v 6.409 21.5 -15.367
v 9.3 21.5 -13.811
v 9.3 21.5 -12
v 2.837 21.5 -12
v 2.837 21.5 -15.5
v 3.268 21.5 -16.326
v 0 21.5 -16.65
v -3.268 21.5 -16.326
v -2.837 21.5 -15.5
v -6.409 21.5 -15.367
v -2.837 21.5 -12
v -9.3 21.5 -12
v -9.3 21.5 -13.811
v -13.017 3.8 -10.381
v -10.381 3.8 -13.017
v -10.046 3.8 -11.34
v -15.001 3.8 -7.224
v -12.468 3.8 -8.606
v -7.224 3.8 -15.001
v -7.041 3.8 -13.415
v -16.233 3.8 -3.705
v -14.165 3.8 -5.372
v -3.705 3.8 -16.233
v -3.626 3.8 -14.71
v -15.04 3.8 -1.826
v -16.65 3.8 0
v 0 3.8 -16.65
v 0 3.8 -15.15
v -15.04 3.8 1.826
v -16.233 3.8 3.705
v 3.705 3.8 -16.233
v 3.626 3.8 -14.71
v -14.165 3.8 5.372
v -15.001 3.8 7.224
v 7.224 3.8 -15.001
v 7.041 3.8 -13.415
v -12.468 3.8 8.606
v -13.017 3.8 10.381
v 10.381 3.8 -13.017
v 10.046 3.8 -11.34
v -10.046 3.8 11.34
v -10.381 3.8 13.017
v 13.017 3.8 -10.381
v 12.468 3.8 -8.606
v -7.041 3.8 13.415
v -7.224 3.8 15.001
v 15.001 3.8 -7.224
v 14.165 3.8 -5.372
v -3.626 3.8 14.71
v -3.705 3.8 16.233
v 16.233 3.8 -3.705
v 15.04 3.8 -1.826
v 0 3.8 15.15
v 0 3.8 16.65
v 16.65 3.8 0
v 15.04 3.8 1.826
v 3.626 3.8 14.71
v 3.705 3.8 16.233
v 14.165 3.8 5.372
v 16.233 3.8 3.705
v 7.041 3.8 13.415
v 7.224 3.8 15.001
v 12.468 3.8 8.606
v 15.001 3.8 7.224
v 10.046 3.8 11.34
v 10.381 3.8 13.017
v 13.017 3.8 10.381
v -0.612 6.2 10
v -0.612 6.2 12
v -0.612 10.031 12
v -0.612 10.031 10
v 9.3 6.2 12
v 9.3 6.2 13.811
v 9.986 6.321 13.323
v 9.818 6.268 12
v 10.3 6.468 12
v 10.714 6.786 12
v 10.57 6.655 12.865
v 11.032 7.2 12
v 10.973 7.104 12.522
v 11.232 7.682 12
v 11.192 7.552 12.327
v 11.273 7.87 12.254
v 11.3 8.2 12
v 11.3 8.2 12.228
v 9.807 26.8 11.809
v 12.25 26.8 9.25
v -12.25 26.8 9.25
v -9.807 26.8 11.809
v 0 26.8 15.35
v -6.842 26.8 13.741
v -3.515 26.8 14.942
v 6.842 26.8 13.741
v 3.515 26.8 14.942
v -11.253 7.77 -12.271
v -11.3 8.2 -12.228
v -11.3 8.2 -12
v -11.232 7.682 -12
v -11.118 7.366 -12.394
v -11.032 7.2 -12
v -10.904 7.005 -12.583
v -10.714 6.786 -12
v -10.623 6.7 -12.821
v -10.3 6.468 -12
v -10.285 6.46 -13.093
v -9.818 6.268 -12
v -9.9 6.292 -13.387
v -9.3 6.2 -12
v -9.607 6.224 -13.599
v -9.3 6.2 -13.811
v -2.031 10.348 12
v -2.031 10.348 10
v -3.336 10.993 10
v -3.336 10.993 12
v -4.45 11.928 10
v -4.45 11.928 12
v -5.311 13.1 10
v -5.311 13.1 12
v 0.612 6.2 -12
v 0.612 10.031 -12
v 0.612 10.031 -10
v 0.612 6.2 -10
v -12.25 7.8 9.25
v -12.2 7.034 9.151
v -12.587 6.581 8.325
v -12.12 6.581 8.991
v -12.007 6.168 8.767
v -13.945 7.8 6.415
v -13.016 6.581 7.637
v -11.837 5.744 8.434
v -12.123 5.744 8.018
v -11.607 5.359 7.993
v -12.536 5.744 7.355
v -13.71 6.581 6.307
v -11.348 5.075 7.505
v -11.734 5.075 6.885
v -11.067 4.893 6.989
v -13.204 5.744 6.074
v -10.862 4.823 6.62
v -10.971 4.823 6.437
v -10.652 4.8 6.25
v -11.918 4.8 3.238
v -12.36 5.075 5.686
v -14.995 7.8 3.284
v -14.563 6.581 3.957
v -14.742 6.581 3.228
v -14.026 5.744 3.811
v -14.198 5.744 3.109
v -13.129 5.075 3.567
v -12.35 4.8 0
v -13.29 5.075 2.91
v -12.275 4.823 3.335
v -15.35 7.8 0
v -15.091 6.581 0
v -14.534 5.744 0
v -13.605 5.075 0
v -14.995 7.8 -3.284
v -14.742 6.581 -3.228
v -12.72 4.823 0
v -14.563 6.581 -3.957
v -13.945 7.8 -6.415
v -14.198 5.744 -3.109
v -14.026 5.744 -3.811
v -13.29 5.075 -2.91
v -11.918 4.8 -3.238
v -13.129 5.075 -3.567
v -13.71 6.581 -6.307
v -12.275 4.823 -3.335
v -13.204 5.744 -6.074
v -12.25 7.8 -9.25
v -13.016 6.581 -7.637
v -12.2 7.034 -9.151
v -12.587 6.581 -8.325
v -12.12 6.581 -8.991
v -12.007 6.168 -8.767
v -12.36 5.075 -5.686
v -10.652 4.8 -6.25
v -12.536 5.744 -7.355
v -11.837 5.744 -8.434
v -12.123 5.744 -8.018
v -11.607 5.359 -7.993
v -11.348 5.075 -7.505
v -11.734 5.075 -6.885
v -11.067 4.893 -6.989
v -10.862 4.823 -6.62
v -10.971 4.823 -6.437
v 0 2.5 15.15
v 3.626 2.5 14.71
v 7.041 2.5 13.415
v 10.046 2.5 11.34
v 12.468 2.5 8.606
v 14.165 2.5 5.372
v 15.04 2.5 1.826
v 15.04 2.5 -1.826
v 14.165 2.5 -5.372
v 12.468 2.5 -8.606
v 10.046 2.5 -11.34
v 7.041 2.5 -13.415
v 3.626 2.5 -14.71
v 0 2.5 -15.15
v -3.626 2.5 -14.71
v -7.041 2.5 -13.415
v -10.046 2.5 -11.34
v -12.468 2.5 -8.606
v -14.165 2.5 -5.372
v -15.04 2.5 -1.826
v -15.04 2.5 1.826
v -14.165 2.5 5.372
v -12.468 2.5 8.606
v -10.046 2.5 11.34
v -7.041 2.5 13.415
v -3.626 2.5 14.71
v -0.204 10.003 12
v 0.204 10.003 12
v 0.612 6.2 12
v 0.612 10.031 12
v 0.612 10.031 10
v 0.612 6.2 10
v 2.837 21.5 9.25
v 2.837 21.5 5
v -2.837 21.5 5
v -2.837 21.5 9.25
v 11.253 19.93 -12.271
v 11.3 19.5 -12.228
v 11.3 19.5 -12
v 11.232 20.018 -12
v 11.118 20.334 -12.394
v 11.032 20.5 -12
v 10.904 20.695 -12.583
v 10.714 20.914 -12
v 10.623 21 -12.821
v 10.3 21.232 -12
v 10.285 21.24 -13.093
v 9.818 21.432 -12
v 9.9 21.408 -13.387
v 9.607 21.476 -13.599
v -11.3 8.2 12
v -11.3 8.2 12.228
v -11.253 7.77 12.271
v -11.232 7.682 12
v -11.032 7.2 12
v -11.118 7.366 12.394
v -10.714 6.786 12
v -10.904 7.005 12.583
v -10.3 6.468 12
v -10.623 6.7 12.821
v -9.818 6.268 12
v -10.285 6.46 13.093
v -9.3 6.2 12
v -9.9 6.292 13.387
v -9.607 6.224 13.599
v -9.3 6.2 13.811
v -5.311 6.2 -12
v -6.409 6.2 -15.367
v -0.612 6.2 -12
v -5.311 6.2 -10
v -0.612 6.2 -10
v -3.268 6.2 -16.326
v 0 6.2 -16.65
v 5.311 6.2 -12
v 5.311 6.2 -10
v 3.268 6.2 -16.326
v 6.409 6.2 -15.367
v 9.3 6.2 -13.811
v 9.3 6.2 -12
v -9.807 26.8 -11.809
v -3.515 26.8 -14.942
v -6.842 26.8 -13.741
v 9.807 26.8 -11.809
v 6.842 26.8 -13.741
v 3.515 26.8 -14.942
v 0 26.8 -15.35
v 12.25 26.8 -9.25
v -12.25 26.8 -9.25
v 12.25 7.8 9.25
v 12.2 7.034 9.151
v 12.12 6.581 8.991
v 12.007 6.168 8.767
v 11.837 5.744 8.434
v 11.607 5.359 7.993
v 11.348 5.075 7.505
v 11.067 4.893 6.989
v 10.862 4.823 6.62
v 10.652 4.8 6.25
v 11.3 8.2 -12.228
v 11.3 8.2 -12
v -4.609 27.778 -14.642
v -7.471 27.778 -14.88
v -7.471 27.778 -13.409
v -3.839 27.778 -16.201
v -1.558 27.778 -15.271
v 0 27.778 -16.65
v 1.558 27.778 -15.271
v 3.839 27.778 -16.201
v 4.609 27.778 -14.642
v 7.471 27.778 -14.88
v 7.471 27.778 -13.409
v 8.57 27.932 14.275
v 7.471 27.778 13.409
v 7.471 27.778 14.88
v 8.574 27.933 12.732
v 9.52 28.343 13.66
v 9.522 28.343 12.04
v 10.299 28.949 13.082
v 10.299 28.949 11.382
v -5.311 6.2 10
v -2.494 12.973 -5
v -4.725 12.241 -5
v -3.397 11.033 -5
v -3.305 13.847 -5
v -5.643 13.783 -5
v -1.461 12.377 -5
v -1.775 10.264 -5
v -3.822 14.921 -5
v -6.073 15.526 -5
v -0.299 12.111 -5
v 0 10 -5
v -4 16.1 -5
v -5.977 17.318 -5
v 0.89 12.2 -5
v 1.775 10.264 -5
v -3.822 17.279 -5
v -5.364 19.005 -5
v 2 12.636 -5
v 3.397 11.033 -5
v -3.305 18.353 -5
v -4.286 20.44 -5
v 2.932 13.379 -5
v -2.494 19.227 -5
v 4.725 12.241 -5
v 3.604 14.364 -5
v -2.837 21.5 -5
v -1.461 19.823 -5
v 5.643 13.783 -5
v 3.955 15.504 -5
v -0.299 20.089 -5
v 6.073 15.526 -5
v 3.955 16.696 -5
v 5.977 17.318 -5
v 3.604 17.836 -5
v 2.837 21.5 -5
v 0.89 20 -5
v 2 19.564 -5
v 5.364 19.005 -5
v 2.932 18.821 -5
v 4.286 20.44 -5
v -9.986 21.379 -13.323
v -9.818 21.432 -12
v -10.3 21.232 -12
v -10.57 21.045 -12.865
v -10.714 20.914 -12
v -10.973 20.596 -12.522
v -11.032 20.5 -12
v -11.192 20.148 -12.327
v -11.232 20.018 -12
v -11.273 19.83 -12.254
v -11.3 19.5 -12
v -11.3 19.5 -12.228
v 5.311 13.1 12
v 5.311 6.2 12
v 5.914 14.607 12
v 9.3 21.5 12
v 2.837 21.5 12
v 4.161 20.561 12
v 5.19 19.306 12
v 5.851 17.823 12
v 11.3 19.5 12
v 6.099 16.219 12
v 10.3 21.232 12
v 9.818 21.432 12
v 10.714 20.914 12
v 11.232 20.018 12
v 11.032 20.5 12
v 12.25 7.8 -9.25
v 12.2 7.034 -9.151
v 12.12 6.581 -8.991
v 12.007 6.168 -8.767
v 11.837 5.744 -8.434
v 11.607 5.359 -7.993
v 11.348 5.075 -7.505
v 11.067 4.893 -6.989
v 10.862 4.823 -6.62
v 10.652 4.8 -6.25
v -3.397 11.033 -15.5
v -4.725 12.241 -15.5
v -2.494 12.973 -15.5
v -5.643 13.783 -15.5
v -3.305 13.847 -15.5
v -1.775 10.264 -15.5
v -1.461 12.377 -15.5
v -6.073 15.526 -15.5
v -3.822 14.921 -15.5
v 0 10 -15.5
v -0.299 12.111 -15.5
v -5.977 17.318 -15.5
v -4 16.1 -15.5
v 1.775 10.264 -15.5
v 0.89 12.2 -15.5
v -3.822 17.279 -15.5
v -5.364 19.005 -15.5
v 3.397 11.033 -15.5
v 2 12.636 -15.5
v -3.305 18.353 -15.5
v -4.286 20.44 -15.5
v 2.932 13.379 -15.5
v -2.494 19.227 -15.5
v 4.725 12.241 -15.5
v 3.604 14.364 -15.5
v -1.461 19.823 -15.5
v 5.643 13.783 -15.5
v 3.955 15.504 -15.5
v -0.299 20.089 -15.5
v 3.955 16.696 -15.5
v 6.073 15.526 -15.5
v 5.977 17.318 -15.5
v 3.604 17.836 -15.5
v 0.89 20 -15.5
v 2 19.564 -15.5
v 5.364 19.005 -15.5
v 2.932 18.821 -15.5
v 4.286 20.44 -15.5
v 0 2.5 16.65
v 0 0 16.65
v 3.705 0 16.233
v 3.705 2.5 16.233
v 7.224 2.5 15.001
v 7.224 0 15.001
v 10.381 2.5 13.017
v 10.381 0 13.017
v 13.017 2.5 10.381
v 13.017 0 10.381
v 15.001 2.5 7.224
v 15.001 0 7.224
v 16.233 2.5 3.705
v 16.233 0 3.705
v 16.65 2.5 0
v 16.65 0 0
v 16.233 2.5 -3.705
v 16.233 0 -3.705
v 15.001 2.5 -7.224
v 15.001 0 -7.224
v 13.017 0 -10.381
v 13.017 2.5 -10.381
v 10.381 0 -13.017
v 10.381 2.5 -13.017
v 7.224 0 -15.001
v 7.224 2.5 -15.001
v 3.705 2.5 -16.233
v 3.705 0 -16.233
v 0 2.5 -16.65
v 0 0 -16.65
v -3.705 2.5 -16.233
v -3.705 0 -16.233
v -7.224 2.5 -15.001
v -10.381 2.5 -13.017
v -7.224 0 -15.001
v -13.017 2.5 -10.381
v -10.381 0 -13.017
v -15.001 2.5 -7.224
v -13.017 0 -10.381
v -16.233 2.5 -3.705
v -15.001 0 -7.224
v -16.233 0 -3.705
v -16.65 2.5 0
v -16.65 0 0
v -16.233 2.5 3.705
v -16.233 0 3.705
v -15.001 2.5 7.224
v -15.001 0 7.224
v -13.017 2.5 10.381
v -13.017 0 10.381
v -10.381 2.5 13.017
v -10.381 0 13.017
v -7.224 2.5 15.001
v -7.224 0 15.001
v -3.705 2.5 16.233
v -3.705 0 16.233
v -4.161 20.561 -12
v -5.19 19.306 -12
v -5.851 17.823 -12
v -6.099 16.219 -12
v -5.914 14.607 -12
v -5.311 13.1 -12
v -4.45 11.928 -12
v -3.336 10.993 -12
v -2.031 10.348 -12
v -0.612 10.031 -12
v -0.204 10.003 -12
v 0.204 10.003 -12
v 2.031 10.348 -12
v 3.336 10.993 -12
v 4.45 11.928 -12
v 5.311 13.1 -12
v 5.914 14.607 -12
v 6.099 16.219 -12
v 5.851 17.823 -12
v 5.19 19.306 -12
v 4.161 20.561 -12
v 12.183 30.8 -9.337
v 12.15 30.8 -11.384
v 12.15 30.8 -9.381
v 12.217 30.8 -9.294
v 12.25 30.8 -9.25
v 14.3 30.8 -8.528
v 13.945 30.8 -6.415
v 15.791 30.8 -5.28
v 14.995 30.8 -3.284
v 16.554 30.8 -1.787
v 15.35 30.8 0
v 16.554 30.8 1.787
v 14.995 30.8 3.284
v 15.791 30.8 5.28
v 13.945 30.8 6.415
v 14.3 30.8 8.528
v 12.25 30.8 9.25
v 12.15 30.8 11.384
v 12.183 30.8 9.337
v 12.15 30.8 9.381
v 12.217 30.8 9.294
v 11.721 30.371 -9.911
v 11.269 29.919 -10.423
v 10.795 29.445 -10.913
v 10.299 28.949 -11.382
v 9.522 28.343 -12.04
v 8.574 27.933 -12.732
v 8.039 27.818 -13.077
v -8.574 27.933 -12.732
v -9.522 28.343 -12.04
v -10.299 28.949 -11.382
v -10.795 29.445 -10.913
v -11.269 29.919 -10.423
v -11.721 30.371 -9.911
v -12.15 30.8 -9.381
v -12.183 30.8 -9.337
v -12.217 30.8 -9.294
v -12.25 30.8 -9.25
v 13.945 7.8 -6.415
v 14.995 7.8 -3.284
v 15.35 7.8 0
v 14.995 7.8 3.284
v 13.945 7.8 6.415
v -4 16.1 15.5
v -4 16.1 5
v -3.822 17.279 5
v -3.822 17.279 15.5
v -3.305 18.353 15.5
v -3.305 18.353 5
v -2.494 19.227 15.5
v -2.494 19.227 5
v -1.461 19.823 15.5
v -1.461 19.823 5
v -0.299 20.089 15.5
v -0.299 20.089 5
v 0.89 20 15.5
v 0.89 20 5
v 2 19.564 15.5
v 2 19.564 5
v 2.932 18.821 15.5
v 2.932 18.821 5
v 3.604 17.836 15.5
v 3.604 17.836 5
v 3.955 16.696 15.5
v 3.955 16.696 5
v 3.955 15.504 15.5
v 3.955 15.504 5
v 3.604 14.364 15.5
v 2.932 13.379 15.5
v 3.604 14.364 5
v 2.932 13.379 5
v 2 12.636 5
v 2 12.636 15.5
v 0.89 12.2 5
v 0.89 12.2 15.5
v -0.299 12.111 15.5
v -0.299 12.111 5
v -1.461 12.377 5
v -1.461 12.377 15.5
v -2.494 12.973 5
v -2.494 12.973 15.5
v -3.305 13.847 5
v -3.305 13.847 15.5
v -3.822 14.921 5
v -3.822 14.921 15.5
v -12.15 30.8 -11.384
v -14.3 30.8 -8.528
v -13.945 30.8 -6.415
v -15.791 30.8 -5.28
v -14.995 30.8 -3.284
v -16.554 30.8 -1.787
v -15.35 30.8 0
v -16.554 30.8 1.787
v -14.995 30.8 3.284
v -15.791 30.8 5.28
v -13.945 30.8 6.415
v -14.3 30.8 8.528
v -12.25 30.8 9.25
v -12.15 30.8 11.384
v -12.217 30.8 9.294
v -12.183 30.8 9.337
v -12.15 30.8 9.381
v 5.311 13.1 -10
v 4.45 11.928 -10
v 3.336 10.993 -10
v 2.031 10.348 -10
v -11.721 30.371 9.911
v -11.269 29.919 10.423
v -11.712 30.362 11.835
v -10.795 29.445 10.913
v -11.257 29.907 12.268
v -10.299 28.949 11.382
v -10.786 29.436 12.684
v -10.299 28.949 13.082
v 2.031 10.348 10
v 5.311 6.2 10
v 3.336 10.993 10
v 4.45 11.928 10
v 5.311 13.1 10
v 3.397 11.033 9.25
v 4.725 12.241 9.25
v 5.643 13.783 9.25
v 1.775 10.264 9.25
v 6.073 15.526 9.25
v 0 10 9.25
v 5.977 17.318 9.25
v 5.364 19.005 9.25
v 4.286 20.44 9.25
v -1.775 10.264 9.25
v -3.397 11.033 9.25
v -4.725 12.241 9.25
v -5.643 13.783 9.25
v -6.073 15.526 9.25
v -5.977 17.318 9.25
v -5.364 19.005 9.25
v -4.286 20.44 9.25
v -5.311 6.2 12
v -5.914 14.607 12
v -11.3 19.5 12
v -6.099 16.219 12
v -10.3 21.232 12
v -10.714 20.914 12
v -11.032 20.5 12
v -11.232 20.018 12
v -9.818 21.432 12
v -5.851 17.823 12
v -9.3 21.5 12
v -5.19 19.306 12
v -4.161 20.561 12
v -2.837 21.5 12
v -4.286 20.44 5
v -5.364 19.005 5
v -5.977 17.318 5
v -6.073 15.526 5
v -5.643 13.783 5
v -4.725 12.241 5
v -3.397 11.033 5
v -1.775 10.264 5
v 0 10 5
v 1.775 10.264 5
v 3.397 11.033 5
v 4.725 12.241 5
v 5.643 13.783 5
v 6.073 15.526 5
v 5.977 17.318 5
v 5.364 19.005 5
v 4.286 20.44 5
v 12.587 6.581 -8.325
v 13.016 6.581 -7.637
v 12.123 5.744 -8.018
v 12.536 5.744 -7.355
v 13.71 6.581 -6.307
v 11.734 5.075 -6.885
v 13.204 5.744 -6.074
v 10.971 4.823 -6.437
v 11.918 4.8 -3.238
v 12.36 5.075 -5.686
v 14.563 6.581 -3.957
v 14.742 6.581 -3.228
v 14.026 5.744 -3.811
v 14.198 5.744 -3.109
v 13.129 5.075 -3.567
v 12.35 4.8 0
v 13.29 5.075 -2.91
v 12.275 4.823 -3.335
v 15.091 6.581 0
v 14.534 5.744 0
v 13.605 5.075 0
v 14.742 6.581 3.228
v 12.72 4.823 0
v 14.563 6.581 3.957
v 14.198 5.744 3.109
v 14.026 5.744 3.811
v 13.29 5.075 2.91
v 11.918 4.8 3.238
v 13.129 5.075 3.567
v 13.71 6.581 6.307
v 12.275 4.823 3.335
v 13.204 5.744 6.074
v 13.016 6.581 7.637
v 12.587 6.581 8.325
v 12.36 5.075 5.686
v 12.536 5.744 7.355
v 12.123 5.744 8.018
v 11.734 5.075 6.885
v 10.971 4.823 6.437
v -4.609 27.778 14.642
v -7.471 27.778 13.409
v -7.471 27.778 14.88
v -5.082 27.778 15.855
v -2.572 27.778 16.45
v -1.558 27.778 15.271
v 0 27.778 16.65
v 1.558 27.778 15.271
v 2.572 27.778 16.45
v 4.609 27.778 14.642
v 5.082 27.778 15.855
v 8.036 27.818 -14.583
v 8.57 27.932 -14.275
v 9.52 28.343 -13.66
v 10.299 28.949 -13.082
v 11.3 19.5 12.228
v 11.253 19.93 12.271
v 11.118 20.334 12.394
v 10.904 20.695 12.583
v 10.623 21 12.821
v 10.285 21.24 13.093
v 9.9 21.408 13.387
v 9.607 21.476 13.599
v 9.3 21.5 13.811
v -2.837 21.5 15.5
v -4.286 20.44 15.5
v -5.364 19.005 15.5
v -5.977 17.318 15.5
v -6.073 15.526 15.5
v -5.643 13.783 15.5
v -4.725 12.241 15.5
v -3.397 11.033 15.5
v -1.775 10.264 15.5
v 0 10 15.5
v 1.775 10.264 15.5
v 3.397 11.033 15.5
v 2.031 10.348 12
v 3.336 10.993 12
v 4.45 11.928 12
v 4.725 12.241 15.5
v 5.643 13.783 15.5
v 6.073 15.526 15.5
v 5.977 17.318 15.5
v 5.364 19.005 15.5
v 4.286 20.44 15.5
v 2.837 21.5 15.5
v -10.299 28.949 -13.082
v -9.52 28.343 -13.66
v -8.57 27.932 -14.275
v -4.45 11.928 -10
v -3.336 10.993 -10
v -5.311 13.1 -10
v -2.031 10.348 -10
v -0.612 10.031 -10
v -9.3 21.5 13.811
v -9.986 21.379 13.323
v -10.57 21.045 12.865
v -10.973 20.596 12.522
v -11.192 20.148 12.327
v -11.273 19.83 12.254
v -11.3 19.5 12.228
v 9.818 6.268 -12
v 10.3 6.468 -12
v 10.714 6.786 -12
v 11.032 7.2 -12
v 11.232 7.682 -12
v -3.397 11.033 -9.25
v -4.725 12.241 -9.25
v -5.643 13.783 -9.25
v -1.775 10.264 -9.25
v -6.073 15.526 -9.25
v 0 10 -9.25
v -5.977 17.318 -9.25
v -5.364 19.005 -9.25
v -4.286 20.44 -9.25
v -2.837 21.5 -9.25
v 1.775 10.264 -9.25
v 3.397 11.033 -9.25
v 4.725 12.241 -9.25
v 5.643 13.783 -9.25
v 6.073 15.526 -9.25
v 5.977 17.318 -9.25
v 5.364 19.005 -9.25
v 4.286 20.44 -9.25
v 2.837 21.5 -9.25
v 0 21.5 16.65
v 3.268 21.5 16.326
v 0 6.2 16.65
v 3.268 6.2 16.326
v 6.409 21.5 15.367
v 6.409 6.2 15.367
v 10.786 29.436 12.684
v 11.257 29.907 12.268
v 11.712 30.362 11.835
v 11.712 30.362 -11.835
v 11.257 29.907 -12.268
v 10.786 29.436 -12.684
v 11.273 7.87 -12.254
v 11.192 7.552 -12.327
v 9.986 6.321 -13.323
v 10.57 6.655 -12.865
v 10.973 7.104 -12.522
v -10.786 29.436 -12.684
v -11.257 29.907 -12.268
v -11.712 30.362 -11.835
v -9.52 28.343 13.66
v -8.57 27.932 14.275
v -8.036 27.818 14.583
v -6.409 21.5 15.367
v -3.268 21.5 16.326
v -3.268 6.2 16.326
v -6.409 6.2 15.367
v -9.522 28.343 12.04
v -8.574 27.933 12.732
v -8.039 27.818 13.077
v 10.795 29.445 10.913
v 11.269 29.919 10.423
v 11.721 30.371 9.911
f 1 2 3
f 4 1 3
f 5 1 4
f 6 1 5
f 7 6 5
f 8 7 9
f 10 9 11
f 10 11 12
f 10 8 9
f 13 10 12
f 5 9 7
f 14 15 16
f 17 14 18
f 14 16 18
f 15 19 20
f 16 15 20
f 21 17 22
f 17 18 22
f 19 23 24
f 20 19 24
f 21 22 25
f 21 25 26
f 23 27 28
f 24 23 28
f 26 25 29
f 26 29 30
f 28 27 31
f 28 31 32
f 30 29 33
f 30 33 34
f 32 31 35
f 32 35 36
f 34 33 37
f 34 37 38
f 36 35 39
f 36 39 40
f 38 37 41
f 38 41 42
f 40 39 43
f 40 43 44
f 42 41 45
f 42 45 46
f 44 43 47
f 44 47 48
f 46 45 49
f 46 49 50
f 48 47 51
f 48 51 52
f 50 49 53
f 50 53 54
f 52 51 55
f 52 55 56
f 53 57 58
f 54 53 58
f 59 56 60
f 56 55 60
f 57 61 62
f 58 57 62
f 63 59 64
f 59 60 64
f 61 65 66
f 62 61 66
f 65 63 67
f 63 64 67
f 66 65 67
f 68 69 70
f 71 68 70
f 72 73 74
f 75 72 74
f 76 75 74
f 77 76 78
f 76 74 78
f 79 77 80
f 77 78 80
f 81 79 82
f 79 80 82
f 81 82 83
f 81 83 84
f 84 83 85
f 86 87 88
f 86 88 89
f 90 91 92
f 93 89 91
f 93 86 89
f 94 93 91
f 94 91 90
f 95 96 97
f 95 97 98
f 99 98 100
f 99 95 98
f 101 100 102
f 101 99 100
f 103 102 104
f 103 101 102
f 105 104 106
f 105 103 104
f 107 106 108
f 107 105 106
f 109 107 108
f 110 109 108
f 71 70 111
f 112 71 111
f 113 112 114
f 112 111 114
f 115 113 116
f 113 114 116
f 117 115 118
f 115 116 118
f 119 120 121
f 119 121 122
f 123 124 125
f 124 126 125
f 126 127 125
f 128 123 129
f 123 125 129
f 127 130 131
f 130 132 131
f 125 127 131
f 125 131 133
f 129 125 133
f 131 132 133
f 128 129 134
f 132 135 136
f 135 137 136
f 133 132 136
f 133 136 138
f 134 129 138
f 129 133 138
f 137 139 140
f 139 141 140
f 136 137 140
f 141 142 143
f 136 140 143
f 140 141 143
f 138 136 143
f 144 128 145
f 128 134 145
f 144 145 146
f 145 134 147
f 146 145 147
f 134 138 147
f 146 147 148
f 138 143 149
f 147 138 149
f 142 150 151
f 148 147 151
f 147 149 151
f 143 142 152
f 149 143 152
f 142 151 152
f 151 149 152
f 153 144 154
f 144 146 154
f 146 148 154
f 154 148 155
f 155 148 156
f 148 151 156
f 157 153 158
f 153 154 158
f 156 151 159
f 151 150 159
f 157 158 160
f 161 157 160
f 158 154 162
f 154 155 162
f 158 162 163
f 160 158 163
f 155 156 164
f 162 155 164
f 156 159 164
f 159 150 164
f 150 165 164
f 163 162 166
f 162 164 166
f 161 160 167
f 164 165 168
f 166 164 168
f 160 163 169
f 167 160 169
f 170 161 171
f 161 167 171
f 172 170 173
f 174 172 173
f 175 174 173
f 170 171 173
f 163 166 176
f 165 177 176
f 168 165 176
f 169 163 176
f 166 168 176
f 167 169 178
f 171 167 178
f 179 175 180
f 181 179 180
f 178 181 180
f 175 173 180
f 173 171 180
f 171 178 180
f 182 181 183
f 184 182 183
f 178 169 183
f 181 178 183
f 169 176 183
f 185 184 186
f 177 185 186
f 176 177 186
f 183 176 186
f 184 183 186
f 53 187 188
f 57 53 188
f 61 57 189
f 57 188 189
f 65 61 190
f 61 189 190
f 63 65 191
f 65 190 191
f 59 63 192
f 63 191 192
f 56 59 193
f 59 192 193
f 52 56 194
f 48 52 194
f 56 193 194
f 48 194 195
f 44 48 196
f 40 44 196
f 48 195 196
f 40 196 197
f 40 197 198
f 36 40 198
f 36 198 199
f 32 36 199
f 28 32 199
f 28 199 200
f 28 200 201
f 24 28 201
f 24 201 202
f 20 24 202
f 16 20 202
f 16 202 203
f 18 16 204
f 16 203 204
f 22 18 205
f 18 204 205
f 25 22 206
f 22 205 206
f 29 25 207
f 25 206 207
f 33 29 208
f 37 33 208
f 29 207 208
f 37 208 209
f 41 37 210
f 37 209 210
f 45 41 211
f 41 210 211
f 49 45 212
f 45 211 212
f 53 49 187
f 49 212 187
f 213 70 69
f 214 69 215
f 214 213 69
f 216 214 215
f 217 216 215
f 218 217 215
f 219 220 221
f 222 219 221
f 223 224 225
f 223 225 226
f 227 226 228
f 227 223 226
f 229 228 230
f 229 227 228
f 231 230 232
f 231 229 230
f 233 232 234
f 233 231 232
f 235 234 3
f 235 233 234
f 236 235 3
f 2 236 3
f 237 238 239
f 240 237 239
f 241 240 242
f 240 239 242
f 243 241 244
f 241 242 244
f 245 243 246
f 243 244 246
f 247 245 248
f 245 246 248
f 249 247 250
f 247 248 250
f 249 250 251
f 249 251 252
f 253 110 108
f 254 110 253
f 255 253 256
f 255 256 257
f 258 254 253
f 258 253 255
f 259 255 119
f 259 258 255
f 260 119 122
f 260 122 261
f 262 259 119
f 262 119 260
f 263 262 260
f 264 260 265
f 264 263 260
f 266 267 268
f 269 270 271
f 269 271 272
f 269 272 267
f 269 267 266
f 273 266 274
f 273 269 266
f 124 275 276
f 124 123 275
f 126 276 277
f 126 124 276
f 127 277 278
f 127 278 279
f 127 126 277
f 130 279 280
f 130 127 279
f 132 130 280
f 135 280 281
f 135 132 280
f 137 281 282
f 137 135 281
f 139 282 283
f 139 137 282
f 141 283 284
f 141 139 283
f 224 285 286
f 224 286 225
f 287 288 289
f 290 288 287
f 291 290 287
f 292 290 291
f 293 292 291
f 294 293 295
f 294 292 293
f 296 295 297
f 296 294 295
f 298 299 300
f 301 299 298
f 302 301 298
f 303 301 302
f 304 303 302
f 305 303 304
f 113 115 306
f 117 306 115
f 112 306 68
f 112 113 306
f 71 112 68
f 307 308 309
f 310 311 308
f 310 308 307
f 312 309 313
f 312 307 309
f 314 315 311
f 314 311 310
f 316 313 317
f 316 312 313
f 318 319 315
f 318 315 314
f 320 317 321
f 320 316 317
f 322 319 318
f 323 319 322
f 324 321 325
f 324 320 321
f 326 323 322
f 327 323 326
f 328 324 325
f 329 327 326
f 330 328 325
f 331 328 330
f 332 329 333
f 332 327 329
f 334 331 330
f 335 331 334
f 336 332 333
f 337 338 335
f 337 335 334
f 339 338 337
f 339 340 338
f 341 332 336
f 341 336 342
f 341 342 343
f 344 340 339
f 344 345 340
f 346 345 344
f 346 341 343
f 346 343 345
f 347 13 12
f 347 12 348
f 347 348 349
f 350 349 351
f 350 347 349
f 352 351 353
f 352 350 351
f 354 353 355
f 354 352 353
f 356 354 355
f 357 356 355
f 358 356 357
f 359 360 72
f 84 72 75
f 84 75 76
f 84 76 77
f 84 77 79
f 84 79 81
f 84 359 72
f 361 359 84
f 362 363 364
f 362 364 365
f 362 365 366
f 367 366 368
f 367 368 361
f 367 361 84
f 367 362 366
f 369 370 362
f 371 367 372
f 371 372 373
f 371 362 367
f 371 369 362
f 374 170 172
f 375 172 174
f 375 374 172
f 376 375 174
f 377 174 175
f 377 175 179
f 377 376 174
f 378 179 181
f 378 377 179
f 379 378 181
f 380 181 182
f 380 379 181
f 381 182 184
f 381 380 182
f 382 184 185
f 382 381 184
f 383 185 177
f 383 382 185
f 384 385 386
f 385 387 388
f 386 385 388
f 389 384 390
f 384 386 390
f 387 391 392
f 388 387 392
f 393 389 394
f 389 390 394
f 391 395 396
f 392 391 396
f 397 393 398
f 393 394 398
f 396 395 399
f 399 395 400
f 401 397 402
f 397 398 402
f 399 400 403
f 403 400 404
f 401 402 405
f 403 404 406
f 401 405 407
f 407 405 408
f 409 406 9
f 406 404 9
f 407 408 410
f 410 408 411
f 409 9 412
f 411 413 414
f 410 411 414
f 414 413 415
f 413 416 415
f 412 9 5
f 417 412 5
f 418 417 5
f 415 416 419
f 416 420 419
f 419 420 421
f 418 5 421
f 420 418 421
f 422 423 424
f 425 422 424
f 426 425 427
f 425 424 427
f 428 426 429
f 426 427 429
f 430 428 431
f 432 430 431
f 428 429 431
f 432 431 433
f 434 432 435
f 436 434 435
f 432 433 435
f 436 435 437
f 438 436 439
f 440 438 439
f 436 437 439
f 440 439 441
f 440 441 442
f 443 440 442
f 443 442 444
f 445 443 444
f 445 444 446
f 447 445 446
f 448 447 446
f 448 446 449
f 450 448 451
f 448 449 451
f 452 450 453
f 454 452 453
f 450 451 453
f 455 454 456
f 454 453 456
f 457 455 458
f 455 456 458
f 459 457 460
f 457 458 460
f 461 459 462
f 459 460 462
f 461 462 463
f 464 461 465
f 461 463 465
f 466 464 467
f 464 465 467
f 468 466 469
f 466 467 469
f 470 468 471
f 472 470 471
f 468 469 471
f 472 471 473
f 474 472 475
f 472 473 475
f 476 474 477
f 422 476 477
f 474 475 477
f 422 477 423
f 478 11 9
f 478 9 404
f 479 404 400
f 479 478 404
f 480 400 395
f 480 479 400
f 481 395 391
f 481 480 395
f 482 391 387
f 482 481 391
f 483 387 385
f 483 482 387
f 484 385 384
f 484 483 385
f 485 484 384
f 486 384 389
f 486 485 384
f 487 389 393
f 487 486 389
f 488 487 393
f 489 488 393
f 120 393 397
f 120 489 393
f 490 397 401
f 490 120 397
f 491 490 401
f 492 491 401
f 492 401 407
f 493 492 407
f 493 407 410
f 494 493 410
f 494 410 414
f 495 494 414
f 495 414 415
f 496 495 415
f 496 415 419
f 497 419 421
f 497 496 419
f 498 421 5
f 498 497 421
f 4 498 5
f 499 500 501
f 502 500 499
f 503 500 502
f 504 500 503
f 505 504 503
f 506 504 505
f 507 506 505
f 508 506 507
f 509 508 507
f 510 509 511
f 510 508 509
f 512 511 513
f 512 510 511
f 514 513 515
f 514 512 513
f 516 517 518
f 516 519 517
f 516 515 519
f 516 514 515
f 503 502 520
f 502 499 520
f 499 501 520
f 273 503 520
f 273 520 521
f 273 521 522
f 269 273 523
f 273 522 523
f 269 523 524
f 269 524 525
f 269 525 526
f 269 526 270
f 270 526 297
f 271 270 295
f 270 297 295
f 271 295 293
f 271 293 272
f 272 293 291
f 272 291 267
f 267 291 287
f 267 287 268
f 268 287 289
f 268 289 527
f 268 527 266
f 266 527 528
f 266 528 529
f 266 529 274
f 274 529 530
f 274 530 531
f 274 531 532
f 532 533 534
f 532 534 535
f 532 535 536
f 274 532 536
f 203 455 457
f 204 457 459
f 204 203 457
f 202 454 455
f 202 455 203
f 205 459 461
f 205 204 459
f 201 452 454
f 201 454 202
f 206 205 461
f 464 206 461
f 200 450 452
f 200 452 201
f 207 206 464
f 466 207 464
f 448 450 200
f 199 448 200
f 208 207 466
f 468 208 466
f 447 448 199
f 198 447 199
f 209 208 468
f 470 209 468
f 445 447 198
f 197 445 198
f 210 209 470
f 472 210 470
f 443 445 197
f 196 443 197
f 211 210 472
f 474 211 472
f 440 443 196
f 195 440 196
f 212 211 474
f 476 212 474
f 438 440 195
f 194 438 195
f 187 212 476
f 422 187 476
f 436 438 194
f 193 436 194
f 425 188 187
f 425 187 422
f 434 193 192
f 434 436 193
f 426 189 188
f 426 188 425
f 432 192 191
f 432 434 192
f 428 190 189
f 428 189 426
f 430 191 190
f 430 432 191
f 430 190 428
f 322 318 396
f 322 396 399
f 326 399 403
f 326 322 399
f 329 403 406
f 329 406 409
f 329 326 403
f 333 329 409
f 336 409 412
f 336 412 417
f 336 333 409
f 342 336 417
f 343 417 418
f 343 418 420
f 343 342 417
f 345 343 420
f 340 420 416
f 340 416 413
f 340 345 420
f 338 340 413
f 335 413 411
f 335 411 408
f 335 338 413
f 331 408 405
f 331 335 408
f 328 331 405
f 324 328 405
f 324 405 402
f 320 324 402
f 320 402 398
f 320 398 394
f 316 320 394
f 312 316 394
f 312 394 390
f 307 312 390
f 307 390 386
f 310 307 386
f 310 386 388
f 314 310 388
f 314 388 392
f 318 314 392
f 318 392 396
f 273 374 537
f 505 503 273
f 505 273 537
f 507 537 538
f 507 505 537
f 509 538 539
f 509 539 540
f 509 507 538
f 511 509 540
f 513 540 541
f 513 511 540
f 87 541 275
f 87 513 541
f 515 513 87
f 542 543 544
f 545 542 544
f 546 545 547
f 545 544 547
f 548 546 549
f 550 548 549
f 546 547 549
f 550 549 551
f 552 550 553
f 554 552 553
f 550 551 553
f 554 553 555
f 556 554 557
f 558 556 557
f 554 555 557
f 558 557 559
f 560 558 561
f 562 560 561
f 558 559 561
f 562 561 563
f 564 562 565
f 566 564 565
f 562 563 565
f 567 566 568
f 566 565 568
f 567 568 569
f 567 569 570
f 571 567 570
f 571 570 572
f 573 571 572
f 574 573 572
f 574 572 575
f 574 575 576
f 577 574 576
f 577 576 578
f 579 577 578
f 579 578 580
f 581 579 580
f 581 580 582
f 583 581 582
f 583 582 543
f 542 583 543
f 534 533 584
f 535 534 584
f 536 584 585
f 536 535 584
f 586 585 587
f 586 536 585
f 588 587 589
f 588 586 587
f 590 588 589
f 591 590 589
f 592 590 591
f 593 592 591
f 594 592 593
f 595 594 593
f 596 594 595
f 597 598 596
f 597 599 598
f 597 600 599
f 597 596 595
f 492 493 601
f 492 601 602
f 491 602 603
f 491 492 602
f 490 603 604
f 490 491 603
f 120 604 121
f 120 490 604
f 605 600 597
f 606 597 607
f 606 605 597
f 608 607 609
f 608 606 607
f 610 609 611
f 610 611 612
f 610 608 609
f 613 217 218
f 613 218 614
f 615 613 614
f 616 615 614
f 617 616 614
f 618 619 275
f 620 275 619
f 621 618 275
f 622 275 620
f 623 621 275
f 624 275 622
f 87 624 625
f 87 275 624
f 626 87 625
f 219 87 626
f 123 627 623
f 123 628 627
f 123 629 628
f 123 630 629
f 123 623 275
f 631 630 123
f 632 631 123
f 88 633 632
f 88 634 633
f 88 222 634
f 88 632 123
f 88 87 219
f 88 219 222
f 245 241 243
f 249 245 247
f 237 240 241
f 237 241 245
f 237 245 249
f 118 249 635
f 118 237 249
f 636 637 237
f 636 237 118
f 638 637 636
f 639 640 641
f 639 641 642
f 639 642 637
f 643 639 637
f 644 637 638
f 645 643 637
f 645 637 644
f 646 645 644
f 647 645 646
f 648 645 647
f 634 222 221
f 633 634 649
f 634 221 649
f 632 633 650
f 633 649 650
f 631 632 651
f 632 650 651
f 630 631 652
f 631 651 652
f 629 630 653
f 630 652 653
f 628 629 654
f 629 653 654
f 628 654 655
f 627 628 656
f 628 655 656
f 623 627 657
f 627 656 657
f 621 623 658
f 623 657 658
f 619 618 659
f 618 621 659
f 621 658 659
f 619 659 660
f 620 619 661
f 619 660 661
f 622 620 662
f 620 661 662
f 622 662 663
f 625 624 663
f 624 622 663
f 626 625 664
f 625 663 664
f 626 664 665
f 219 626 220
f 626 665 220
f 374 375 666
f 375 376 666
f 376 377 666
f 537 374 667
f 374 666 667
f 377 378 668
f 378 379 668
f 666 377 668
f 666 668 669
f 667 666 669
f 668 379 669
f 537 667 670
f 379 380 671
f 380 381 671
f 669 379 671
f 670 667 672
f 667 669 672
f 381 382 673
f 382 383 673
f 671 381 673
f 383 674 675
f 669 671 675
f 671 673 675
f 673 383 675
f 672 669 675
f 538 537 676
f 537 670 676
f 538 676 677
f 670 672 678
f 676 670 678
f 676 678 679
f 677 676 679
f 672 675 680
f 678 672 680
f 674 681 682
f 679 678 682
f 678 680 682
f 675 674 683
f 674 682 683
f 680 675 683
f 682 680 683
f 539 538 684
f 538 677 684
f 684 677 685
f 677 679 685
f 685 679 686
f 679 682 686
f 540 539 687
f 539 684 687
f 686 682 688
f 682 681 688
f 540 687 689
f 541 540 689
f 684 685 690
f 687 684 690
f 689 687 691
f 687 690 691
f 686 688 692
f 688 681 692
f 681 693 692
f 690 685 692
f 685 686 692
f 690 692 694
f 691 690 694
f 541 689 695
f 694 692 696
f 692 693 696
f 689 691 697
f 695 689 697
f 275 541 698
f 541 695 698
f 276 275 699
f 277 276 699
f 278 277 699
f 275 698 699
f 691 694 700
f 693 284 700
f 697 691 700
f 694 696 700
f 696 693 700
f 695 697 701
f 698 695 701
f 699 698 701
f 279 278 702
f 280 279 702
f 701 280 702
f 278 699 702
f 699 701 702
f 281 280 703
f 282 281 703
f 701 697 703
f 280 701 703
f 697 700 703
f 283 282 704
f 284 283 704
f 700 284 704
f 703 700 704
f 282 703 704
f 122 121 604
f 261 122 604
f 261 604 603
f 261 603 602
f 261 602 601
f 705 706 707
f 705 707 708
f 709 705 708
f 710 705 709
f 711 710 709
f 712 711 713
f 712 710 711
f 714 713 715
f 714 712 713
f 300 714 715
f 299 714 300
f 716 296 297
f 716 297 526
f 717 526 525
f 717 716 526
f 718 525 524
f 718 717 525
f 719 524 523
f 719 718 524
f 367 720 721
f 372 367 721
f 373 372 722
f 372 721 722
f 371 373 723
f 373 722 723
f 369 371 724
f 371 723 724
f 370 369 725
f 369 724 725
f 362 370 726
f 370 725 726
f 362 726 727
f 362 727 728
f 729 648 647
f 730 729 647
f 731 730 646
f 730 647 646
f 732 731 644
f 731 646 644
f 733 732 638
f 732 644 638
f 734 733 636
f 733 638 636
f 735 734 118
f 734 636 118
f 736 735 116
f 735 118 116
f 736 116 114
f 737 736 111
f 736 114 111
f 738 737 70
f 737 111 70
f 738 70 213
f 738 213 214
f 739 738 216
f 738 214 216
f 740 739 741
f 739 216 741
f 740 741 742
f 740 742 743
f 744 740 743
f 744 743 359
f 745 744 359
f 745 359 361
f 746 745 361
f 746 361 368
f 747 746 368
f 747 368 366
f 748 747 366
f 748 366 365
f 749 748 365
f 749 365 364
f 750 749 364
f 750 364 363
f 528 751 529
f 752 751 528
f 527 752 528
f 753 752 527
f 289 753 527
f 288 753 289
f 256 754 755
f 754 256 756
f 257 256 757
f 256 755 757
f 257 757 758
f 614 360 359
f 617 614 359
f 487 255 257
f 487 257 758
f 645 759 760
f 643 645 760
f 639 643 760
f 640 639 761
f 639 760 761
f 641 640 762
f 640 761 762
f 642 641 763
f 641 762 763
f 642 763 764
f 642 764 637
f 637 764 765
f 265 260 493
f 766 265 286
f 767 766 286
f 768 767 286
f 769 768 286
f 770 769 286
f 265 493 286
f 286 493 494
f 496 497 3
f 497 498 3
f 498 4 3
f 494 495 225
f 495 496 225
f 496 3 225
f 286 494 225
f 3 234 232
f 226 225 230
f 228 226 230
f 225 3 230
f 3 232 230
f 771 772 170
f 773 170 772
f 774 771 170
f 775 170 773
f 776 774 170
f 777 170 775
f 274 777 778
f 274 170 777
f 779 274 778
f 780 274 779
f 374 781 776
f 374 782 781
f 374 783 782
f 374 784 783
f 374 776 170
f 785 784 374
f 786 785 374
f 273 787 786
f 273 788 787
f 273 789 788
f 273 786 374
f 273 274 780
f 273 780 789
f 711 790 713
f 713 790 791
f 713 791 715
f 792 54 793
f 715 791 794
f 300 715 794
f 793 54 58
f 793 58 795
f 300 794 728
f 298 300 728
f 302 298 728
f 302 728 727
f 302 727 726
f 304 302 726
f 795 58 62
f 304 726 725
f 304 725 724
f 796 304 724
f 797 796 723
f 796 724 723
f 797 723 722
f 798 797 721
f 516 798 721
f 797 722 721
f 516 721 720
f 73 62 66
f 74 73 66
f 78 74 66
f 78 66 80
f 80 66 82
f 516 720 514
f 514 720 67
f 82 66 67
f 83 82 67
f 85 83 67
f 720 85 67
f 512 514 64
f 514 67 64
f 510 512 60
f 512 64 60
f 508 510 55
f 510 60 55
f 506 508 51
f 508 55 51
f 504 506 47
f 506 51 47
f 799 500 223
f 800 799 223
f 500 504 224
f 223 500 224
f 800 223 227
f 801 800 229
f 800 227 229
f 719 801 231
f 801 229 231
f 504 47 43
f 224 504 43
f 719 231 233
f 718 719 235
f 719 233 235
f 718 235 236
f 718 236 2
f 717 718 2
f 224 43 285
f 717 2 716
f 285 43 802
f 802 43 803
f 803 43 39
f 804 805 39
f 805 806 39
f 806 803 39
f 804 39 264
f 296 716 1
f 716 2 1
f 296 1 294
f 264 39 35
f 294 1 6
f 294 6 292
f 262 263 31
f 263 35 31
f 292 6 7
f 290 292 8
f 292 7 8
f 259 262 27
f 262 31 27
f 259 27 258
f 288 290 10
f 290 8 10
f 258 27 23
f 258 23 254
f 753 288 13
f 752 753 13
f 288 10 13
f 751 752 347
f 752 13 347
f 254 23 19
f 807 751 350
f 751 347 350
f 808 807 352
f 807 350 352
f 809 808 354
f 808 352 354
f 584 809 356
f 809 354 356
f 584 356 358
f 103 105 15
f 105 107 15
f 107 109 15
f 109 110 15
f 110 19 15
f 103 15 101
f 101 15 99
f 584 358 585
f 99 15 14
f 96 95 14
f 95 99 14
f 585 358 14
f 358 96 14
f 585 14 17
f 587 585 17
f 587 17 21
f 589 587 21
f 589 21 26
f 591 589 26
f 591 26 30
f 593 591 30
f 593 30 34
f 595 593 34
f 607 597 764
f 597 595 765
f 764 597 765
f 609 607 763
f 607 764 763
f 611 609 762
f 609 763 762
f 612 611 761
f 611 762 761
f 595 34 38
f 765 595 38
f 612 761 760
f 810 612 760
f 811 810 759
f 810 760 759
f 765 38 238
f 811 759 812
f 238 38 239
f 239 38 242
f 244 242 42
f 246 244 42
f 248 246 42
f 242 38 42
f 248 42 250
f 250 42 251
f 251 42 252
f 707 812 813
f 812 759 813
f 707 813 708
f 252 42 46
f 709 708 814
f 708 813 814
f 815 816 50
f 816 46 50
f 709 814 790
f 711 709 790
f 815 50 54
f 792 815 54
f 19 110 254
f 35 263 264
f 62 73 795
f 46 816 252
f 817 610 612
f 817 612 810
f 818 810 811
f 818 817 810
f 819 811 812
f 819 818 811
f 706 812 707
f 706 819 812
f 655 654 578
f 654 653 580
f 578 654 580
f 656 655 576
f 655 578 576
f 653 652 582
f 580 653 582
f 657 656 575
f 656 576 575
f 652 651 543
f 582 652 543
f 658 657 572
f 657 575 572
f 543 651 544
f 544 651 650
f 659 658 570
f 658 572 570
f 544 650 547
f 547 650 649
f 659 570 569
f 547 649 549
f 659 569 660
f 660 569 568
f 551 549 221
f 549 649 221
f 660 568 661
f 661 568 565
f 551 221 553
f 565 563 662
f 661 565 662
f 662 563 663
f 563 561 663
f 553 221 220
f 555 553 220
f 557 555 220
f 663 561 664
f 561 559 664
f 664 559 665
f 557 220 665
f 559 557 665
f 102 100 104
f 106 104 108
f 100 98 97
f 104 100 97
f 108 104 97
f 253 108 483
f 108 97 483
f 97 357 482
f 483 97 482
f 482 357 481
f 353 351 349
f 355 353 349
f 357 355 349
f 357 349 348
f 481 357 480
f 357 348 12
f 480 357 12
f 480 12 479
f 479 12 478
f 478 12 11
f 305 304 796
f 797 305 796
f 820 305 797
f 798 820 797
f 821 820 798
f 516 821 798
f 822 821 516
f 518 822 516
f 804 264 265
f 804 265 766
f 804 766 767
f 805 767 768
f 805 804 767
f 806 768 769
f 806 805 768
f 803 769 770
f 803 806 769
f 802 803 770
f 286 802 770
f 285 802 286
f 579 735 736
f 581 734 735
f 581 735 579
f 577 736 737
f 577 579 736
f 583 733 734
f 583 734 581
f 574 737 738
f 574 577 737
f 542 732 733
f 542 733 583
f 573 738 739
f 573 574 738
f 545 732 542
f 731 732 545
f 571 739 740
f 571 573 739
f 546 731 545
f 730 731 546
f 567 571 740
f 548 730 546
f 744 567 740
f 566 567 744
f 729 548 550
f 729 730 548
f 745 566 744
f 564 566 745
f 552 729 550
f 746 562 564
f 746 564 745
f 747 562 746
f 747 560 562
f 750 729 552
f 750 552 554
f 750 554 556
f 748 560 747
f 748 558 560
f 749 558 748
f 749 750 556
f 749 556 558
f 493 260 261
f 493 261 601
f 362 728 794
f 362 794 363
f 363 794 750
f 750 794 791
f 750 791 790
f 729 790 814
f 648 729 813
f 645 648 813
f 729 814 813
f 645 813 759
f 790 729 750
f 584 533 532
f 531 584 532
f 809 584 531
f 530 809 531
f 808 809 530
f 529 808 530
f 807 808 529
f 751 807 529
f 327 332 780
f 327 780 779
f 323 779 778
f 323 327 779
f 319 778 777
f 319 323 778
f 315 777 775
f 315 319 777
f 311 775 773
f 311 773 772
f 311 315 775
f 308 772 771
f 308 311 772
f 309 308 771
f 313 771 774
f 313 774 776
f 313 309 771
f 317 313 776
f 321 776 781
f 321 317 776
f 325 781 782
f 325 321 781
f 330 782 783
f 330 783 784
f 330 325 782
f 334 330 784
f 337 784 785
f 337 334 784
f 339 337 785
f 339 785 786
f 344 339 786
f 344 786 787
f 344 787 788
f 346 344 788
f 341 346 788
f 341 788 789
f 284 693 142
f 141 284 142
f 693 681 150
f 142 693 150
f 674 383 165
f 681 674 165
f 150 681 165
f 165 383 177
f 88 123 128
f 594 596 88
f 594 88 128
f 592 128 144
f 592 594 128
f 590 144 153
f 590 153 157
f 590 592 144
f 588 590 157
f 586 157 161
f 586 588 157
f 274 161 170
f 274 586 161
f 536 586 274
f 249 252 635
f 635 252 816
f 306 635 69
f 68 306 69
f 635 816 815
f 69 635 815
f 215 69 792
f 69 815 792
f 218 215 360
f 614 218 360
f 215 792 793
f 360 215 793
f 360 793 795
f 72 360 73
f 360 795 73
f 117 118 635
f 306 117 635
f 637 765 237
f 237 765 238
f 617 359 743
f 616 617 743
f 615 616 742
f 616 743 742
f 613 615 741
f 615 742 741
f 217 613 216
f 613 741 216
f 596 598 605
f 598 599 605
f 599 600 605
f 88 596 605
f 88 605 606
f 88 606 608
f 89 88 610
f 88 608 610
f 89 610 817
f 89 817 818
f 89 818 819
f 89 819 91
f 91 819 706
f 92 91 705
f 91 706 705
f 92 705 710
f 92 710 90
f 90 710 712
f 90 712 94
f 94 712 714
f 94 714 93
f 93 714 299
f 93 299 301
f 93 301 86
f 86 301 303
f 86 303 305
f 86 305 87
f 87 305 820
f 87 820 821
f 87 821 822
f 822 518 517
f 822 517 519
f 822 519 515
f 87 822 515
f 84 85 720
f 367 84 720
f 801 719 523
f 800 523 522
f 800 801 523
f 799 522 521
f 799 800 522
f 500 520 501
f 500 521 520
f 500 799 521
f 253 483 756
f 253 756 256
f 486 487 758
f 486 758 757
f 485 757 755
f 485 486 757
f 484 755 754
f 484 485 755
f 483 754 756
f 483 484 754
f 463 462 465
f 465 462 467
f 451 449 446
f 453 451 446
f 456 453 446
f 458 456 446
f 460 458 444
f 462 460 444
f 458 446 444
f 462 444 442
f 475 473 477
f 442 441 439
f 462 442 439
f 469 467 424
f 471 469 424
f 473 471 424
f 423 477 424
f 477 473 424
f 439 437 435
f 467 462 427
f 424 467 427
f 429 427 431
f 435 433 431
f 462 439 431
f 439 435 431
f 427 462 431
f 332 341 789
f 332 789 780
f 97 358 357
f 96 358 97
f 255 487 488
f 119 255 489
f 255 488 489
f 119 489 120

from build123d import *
from build123d.topology import SkipClean

# Parameters (mm, degrees)
SKETCH1_R               = 16.65
BOSS_EXTRUDE1_DEPTH     = 2.5
SKETCH2_R               = 15.15
BOSS_EXTRUDE2_DEPTH     = 1.3
SKETCH3_R               = 16.65
BOSS_EXTRUDE3_DEPTH     = 27
CUT_EXTRUDE1_DEPTH      = 27
CUT_EXTRUDE1_DEPTH_BACK = 27
CUT_EXTRUDE2_DEPTH      = 26
CUT_EXTRUDE3_DEPTH      = 12.5
BOSS_EXTRUDE4_START     = -7
SKETCH8_R               = 4
BOSS_EXTRUDE4_DEPTH     = 10.5
FILLET1_R               = 3
SKETCH9_R               = 4
CUT_EXTRUDE4_DEPTH      = 33.5
CUT_EXTRUDE5_DEPTH      = 2
SKETCH11_R              = 15.35
CUT_EXTRUDE6_DEPTH      = 4


with BuildPart() as part:
    # Sketch1 → Boss-Extrude1 (new body)
    with BuildSketch(Plane(origin=(0, 0, 0), x_dir=(1, 0, 0), z_dir=(0, 1, 0))):
        Circle(SKETCH1_R)
    extrude(amount=BOSS_EXTRUDE1_DEPTH)

    # Sketch2 → Boss-Extrude2 (add)
    with BuildSketch(Plane(origin=(0, 2.5, 0), x_dir=(1, 0, 0), z_dir=(0, 1, 0))):
        Circle(SKETCH2_R)
    extrude(amount=BOSS_EXTRUDE2_DEPTH)

    # Sketch3 → Boss-Extrude3 (add)
    with BuildSketch(Plane(origin=(0, 3.8, 0), x_dir=(1, 0, 0), z_dir=(0, 1, 0))):
        Circle(SKETCH3_R)
    extrude(amount=BOSS_EXTRUDE3_DEPTH)

    # Sketch4 → Cut-Extrude1 (cut, two sides: drawn at the far end of the back side and taken through both)
    with BuildSketch(Plane.XY.offset(-CUT_EXTRUDE1_DEPTH_BACK)):
        with BuildLine():
            Line((-12.15, 30.8), (-10.299201712, 28.949201712))
            ThreePointArc((-10.299201712, 28.949201712), (-9.001508317, 28.082110707), (-7.470774587, 27.777628837))
            Line((-7.470774587, 27.777628837), (7.470774587, 27.777628837))
            ThreePointArc((7.470774587, 27.777628837), (9.001508317, 28.082110707), (10.299201712, 28.949201712))
            Line((10.299201712, 28.949201712), (12.15, 30.8))
            Line((12.15, 30.8), (-12.15, 30.8))
        make_face()
    extrude(amount=CUT_EXTRUDE1_DEPTH + CUT_EXTRUDE1_DEPTH_BACK, mode=Mode.SUBTRACT)

    # Sketch6 → Cut-Extrude2 (cut)
    with BuildSketch(Plane(origin=(0, 30.8, 0), x_dir=(1, 0, 0), z_dir=(0, 1, 0))):
        with BuildLine():
            Line((-12.249897959, 9.25), (12.249897959, 9.25))
            ThreePointArc((12.249897959, 9.25), (15.35, 0), (12.249897959, -9.25))
            Line((12.249897959, -9.25), (-12.249897959, -9.25))
            ThreePointArc((-12.249897959, -9.25), (-15.35, 0), (-12.249897959, 9.25))
        make_face()
    extrude(amount=-CUT_EXTRUDE2_DEPTH, mode=Mode.SUBTRACT)

    # Sketch7 → Cut-Extrude3 (cut)
    with BuildSketch(Plane.XY.offset(24.5)):
        with BuildLine():
            Line((-9.3, 6.2), (9.3, 6.2))
            ThreePointArc((9.3, 6.2), (10.714213562, 6.785786438), (11.3, 8.2))
            Line((11.3, 8.2), (11.3, 19.5))
            ThreePointArc((11.3, 19.5), (10.714213562, 20.914213562), (9.3, 21.5))
            Line((9.3, 21.5), (-9.3, 21.5))
            ThreePointArc((-9.3, 21.5), (-10.714213562, 20.914213562), (-11.3, 19.5))
            Line((-11.3, 19.5), (-11.3, 8.2))
            ThreePointArc((-11.3, 8.2), (-10.714213562, 6.785786438), (-9.3, 6.2))
        make_face()
    cut_extrude3 = extrude(amount=-CUT_EXTRUDE3_DEPTH, mode=Mode.SUBTRACT)

    # Mirror1: Cut-Extrude3 across plane
    add(cut_extrude3.mirror(Plane.XY), mode=Mode.SUBTRACT)

    # Sketch8 → Boss-Extrude4 (add)
    with BuildSketch(Plane(origin=(0, 0, -12), x_dir=(-1, 0, 0), z_dir=(0, 0, -1)).offset(BOSS_EXTRUDE4_START)):
        with BuildLine():
            Line((-2.837252192, 21.5), (2.837252192, 21.5))
            ThreePointArc((2.837252192, 21.5), (0, 10), (-2.837252192, 21.5))
        make_face()
        with Locations((0, 16.1)):
            Circle(SKETCH8_R, mode=Mode.SUBTRACT)
    boss_extrude4 = extrude(amount=BOSS_EXTRUDE4_DEPTH)

    # Mirror2: Boss-Extrude4 across plane
    add(boss_extrude4.mirror(Plane.XY))

    # Fillet1
    fillet1_edges = [part.edges().sort_by_distance(p)[0] for p in [
        (0, 4.8, 9.25),
        (-15.35, 4.8, 0),
        (0, 4.8, -9.25),
        (15.35, 4.8, 0),
    ]]
    fillet(fillet1_edges, radius=FILLET1_R)

    # Sketch9 → Cut-Extrude4 (cut)
    with BuildSketch(Plane(origin=(0, 0, -12), x_dir=(-1, 0, 0), z_dir=(0, 0, -1))):
        with Locations((0, 16.1)):
            Circle(SKETCH9_R)
    extrude(amount=-CUT_EXTRUDE4_DEPTH, mode=Mode.SUBTRACT)

    # Sketch10 → Cut-Extrude5 (cut)
    with SkipClean():  # the faces are left unmerged after this step: merging them gives an invalid solid
        with BuildSketch(Plane(origin=(0, 0, -12), x_dir=(-1, 0, 0), z_dir=(0, 0, -1))):
            with BuildLine():
                Line((0.611782833, 6.2), (0.611782833, 10.03075608))
                ThreePointArc((0.611782833, 10.03075608), (3.335542493, 10.992734952), (5.311313245, 13.100008065))
                Line((5.311313245, 13.100008065), (5.311313245, 6.2))
                Line((5.311313245, 6.2), (0.611782833, 6.2))
            make_face()
            with BuildLine():
                Line((-5.311313245, 6.2), (-5.311313245, 13.100008065))
                ThreePointArc((-5.311313245, 13.100008065), (-3.335542493, 10.992734952), (-0.611782833, 10.03075608))
                Line((-0.611782833, 10.03075608), (-0.611782833, 6.2))
                Line((-0.611782833, 6.2), (-5.311313245, 6.2))
            make_face()
        cut_extrude5 = extrude(amount=-CUT_EXTRUDE5_DEPTH, mode=Mode.SUBTRACT)

    # Mirror3: Cut-Extrude5 across plane
    with SkipClean():  # the faces are left unmerged after this step: merging them gives an invalid solid
        add(cut_extrude5.mirror(Plane.XY), mode=Mode.SUBTRACT)

    # Sketch11 → Cut-Extrude6 (cut)
    with SkipClean():  # the faces are left unmerged after this step: merging them gives an invalid solid
        with BuildSketch(Plane(origin=(0, 30.8, 0), x_dir=(1, 0, 0), z_dir=(0, 1, 0))):
            Circle(SKETCH11_R)
        extrude(amount=-CUT_EXTRUDE6_DEPTH, mode=Mode.SUBTRACT)


solid = part.part
